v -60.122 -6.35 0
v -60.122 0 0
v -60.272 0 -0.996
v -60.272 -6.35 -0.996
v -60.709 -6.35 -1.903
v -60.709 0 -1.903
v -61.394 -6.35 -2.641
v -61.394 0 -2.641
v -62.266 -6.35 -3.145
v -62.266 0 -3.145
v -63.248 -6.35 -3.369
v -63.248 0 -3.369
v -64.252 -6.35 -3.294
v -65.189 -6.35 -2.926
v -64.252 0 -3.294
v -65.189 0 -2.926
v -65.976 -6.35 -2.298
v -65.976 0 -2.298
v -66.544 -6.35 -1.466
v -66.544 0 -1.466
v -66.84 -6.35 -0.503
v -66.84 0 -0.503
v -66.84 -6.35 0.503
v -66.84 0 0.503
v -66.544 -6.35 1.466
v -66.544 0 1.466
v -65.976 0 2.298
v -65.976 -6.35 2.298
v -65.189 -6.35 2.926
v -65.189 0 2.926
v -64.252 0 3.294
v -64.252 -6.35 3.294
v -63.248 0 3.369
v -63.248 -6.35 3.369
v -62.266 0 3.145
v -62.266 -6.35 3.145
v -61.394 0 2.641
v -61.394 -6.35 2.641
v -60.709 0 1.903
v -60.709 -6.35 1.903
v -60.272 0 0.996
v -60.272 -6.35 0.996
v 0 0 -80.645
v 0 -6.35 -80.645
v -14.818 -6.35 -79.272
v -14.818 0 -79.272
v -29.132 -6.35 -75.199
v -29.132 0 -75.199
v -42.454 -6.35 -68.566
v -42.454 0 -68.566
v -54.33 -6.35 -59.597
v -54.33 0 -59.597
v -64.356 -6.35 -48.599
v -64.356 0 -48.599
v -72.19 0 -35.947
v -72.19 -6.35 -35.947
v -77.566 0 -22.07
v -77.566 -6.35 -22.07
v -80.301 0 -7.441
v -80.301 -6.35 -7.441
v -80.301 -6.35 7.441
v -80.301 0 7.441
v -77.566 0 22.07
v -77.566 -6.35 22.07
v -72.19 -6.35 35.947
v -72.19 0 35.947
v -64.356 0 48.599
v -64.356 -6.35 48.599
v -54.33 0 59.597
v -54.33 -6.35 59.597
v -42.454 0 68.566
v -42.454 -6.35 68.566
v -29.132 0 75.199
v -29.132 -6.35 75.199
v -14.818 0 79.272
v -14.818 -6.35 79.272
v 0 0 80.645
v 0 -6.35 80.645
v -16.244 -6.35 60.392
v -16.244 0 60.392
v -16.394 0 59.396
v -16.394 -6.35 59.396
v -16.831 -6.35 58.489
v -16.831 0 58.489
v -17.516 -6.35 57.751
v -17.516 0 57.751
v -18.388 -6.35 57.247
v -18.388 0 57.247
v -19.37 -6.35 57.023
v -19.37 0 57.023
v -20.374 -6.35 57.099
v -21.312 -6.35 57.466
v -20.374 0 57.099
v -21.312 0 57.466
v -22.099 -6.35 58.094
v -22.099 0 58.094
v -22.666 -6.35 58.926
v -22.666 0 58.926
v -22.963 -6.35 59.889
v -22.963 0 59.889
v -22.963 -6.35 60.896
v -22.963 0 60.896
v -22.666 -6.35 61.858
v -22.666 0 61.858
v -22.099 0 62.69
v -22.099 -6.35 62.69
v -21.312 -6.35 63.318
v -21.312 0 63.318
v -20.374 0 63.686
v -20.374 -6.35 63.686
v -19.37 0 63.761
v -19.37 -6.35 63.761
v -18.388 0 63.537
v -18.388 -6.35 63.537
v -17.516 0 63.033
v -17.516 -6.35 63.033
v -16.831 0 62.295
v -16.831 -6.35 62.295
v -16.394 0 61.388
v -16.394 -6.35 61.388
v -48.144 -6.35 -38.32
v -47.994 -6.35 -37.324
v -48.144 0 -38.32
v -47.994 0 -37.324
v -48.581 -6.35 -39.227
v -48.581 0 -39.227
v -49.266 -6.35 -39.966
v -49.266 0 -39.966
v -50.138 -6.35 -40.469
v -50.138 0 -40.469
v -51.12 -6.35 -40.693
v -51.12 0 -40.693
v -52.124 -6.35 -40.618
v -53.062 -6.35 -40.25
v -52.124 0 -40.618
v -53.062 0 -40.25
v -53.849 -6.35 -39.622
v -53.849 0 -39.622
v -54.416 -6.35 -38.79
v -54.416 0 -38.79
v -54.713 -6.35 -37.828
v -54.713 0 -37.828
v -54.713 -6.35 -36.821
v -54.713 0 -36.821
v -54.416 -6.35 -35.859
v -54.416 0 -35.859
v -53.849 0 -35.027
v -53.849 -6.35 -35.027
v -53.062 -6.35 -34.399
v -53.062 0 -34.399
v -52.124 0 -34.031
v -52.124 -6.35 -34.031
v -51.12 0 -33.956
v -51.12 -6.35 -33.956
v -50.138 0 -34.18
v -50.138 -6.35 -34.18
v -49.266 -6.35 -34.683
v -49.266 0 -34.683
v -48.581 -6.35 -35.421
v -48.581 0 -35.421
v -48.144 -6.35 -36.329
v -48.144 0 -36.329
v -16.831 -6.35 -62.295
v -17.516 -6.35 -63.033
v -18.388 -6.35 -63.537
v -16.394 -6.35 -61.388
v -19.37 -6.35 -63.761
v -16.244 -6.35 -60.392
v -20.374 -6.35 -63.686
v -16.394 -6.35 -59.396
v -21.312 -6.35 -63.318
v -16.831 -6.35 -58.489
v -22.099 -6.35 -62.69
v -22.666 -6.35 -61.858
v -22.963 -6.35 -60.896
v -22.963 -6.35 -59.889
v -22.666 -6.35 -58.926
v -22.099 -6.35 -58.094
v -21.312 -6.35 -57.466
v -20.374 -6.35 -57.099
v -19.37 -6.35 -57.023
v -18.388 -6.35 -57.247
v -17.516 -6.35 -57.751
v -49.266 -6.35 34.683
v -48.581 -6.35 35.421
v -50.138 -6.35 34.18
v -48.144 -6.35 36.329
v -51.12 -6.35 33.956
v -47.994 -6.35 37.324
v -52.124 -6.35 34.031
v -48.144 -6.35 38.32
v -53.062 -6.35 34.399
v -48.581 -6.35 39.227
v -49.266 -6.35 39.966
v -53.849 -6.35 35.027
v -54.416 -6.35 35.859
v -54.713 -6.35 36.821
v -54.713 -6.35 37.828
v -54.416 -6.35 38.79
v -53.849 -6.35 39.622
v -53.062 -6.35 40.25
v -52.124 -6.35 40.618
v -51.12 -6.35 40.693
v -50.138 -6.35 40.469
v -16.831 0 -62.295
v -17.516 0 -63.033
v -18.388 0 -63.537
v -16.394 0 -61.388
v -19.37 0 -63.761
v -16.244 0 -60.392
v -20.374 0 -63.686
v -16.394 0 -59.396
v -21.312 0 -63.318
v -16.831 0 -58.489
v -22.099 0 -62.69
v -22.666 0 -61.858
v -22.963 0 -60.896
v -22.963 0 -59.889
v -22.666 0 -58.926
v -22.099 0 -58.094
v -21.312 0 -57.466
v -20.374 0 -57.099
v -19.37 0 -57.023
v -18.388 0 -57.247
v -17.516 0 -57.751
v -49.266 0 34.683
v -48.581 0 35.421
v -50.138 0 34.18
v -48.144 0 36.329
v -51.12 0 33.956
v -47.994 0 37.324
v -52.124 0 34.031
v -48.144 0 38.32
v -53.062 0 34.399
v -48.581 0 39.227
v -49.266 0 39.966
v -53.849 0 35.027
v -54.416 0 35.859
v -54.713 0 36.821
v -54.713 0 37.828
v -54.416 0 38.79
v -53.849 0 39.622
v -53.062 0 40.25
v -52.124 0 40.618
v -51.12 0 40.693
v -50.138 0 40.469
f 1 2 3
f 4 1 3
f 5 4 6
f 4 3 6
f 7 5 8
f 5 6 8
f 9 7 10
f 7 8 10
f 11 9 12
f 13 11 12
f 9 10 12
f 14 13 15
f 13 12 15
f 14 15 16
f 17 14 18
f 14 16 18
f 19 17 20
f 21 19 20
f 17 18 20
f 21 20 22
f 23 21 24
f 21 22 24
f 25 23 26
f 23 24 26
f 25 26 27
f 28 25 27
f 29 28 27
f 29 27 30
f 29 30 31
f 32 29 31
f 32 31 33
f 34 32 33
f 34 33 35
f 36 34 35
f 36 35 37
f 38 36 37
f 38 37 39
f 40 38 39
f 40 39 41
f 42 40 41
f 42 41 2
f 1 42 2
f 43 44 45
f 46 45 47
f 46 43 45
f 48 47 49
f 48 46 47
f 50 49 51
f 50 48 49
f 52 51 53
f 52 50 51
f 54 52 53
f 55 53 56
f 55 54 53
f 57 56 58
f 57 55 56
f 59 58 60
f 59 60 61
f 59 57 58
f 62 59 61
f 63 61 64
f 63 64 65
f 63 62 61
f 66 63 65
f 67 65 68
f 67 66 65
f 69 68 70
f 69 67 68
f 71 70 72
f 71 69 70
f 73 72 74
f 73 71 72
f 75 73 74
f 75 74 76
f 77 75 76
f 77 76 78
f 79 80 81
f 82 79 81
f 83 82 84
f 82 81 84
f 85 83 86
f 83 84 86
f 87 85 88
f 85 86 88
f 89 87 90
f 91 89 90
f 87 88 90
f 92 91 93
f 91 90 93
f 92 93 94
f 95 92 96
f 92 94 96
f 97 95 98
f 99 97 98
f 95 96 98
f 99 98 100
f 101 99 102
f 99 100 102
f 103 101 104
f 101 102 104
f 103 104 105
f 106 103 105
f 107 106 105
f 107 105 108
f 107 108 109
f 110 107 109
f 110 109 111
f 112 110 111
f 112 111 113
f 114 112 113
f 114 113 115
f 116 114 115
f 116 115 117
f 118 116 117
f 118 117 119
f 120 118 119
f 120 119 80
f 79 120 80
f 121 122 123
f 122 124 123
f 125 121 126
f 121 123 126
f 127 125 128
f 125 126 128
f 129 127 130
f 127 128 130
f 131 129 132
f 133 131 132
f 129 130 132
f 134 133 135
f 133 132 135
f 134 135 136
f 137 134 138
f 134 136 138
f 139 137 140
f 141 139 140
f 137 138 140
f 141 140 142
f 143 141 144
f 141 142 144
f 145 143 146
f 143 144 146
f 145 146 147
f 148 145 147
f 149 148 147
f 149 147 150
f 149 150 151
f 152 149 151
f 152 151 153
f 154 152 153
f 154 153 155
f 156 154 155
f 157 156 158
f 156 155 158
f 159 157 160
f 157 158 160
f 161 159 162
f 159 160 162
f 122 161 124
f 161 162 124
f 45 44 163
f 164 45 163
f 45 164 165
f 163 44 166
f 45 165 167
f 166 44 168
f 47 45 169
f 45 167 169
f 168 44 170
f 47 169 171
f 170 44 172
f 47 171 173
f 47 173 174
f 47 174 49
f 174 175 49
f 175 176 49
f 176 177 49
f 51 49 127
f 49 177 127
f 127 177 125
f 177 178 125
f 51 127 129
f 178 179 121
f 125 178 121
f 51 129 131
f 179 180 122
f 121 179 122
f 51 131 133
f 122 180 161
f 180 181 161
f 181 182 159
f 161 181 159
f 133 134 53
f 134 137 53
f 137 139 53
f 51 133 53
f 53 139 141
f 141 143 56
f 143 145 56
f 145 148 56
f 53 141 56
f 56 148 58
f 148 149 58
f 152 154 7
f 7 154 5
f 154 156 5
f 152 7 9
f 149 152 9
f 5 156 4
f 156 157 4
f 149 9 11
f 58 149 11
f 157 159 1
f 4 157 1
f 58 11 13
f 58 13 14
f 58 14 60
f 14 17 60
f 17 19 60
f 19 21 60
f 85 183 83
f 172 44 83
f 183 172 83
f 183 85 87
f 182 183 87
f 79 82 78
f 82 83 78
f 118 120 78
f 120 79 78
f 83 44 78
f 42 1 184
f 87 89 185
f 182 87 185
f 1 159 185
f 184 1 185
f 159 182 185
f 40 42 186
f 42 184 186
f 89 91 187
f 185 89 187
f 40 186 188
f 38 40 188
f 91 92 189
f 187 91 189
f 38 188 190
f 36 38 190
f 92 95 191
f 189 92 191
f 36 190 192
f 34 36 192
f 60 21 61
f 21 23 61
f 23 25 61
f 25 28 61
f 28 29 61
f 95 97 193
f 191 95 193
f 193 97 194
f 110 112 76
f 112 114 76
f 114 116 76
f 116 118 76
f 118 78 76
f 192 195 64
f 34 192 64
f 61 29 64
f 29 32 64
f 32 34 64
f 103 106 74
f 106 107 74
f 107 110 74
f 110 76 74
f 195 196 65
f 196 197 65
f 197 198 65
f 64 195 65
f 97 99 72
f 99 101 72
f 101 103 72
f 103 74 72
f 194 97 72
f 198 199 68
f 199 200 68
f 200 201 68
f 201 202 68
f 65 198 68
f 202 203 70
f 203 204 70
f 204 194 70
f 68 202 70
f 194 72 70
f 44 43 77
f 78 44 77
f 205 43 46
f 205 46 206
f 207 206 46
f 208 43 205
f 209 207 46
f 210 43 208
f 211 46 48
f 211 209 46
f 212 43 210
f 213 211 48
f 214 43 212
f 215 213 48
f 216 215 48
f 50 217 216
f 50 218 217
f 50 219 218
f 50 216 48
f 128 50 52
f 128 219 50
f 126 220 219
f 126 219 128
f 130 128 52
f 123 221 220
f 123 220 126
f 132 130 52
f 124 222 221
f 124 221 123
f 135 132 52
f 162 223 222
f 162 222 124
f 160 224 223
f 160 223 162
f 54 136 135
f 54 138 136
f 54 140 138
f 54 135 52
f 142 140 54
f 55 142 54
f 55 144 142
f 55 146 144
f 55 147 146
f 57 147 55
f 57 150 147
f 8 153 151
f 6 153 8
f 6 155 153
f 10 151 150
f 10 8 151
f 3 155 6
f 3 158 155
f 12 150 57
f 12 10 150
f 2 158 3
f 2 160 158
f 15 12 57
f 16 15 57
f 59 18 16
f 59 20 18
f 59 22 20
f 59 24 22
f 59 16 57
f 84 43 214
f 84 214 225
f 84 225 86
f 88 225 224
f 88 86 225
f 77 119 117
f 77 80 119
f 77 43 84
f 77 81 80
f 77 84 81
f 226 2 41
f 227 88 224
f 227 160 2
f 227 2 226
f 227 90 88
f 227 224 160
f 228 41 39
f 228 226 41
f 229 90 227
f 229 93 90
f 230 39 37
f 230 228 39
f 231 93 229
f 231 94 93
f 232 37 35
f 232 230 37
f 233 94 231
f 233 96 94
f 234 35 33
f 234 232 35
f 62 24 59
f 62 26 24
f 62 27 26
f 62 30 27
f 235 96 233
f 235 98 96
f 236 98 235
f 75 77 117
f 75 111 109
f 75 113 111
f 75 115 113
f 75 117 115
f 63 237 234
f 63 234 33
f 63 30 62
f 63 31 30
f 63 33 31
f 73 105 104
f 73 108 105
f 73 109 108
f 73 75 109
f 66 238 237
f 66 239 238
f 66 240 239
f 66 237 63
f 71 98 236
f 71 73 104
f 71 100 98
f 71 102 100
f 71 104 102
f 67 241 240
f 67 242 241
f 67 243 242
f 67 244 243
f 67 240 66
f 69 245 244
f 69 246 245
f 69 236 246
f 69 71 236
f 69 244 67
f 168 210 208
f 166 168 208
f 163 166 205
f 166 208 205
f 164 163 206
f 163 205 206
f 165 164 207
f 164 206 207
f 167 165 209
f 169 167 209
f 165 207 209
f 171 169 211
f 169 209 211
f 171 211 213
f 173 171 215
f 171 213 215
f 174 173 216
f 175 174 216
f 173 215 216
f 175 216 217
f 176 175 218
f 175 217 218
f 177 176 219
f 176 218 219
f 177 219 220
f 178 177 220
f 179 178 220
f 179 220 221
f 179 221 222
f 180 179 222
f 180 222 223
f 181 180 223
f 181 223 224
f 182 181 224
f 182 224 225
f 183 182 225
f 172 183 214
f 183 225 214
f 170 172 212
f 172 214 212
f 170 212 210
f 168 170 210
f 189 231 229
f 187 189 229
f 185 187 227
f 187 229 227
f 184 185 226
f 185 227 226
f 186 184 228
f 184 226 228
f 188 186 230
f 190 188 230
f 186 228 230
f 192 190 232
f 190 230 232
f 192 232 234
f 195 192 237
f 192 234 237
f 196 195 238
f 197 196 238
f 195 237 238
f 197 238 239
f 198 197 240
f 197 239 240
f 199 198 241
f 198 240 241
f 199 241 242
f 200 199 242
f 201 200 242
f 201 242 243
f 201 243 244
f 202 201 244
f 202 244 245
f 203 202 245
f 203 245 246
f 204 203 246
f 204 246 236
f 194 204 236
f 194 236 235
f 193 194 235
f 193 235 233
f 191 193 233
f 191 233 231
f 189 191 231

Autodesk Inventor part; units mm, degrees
ref_plane "YZ Plane" through (0, 0, 0) normal (1, 0, 0) x (0, 1, 0)
ref_plane "XZ Plane" through (0, 0, 0) normal (0, 1, 0) x (-1, 0, 0)
ref_plane "XY Plane" through (0, 0, 0) normal (0, 0, 1) x (1, 0, 0)
sketch "Sketch1" plane through (0, 0, 0) normal (0, 1, 0) x (-1, 0, 0)
  circle A0 centre (0, 0) radius 80.645
  dimension "d4" = 161.29
extrude "Extrusion1" add sketch "Sketch1" against normal blind 6.35
sketch "Sketch2" plane through (0, 0, 0) normal (0, 1, 0) x (1, 0, 0)
  arc A0 (0, -80.645) -> (0, 80.645) centre (0, 0) ccw
  circle A1 centre (0, 0) radius 80.645 projected
  line L0 (0, 80.645) -> (0, -80.645)
extrude "Extrusion2" cut sketch "Sketch2" against normal through all contours L0 A0
sketch "Sketch5" plane through (0, 0, 0) normal (0, 1, 0) x (1, 0, 0)
  circle A0 centre (0, 0) radius 63.5 construction
  circle A1 centre (-63.5, 0) radius 3.3782
  circle A2 centre (-51.3726, -37.3244) radius 3.3782
  circle A3 centre (-19.6226, -60.3921) radius 3.3782
  circle A4 centre (19.6226, -60.3921) radius 3.3782
  circle A5 centre (51.3726, -37.3244) radius 3.3782
  circle A6 centre (63.5, 0) radius 3.3782
  circle A7 centre (51.3726, 37.3244) radius 3.3782
  circle A8 centre (19.6226, 60.3921) radius 3.3782
  circle A9 centre (-19.6226, 60.3921) radius 3.3782
  circle A10 centre (-51.3726, 37.3244) radius 3.3782
  dimension "d17" = 127
  dimension "d18" = 6.7564
  dimension "d21" = 360
extrude "Extrusion3" cut sketch "Sketch5" against normal through all contours A1 | A2 | A3 | A9 | A10
properties part number "SupportPlateForWaterHalf" material "PET Plastic"
